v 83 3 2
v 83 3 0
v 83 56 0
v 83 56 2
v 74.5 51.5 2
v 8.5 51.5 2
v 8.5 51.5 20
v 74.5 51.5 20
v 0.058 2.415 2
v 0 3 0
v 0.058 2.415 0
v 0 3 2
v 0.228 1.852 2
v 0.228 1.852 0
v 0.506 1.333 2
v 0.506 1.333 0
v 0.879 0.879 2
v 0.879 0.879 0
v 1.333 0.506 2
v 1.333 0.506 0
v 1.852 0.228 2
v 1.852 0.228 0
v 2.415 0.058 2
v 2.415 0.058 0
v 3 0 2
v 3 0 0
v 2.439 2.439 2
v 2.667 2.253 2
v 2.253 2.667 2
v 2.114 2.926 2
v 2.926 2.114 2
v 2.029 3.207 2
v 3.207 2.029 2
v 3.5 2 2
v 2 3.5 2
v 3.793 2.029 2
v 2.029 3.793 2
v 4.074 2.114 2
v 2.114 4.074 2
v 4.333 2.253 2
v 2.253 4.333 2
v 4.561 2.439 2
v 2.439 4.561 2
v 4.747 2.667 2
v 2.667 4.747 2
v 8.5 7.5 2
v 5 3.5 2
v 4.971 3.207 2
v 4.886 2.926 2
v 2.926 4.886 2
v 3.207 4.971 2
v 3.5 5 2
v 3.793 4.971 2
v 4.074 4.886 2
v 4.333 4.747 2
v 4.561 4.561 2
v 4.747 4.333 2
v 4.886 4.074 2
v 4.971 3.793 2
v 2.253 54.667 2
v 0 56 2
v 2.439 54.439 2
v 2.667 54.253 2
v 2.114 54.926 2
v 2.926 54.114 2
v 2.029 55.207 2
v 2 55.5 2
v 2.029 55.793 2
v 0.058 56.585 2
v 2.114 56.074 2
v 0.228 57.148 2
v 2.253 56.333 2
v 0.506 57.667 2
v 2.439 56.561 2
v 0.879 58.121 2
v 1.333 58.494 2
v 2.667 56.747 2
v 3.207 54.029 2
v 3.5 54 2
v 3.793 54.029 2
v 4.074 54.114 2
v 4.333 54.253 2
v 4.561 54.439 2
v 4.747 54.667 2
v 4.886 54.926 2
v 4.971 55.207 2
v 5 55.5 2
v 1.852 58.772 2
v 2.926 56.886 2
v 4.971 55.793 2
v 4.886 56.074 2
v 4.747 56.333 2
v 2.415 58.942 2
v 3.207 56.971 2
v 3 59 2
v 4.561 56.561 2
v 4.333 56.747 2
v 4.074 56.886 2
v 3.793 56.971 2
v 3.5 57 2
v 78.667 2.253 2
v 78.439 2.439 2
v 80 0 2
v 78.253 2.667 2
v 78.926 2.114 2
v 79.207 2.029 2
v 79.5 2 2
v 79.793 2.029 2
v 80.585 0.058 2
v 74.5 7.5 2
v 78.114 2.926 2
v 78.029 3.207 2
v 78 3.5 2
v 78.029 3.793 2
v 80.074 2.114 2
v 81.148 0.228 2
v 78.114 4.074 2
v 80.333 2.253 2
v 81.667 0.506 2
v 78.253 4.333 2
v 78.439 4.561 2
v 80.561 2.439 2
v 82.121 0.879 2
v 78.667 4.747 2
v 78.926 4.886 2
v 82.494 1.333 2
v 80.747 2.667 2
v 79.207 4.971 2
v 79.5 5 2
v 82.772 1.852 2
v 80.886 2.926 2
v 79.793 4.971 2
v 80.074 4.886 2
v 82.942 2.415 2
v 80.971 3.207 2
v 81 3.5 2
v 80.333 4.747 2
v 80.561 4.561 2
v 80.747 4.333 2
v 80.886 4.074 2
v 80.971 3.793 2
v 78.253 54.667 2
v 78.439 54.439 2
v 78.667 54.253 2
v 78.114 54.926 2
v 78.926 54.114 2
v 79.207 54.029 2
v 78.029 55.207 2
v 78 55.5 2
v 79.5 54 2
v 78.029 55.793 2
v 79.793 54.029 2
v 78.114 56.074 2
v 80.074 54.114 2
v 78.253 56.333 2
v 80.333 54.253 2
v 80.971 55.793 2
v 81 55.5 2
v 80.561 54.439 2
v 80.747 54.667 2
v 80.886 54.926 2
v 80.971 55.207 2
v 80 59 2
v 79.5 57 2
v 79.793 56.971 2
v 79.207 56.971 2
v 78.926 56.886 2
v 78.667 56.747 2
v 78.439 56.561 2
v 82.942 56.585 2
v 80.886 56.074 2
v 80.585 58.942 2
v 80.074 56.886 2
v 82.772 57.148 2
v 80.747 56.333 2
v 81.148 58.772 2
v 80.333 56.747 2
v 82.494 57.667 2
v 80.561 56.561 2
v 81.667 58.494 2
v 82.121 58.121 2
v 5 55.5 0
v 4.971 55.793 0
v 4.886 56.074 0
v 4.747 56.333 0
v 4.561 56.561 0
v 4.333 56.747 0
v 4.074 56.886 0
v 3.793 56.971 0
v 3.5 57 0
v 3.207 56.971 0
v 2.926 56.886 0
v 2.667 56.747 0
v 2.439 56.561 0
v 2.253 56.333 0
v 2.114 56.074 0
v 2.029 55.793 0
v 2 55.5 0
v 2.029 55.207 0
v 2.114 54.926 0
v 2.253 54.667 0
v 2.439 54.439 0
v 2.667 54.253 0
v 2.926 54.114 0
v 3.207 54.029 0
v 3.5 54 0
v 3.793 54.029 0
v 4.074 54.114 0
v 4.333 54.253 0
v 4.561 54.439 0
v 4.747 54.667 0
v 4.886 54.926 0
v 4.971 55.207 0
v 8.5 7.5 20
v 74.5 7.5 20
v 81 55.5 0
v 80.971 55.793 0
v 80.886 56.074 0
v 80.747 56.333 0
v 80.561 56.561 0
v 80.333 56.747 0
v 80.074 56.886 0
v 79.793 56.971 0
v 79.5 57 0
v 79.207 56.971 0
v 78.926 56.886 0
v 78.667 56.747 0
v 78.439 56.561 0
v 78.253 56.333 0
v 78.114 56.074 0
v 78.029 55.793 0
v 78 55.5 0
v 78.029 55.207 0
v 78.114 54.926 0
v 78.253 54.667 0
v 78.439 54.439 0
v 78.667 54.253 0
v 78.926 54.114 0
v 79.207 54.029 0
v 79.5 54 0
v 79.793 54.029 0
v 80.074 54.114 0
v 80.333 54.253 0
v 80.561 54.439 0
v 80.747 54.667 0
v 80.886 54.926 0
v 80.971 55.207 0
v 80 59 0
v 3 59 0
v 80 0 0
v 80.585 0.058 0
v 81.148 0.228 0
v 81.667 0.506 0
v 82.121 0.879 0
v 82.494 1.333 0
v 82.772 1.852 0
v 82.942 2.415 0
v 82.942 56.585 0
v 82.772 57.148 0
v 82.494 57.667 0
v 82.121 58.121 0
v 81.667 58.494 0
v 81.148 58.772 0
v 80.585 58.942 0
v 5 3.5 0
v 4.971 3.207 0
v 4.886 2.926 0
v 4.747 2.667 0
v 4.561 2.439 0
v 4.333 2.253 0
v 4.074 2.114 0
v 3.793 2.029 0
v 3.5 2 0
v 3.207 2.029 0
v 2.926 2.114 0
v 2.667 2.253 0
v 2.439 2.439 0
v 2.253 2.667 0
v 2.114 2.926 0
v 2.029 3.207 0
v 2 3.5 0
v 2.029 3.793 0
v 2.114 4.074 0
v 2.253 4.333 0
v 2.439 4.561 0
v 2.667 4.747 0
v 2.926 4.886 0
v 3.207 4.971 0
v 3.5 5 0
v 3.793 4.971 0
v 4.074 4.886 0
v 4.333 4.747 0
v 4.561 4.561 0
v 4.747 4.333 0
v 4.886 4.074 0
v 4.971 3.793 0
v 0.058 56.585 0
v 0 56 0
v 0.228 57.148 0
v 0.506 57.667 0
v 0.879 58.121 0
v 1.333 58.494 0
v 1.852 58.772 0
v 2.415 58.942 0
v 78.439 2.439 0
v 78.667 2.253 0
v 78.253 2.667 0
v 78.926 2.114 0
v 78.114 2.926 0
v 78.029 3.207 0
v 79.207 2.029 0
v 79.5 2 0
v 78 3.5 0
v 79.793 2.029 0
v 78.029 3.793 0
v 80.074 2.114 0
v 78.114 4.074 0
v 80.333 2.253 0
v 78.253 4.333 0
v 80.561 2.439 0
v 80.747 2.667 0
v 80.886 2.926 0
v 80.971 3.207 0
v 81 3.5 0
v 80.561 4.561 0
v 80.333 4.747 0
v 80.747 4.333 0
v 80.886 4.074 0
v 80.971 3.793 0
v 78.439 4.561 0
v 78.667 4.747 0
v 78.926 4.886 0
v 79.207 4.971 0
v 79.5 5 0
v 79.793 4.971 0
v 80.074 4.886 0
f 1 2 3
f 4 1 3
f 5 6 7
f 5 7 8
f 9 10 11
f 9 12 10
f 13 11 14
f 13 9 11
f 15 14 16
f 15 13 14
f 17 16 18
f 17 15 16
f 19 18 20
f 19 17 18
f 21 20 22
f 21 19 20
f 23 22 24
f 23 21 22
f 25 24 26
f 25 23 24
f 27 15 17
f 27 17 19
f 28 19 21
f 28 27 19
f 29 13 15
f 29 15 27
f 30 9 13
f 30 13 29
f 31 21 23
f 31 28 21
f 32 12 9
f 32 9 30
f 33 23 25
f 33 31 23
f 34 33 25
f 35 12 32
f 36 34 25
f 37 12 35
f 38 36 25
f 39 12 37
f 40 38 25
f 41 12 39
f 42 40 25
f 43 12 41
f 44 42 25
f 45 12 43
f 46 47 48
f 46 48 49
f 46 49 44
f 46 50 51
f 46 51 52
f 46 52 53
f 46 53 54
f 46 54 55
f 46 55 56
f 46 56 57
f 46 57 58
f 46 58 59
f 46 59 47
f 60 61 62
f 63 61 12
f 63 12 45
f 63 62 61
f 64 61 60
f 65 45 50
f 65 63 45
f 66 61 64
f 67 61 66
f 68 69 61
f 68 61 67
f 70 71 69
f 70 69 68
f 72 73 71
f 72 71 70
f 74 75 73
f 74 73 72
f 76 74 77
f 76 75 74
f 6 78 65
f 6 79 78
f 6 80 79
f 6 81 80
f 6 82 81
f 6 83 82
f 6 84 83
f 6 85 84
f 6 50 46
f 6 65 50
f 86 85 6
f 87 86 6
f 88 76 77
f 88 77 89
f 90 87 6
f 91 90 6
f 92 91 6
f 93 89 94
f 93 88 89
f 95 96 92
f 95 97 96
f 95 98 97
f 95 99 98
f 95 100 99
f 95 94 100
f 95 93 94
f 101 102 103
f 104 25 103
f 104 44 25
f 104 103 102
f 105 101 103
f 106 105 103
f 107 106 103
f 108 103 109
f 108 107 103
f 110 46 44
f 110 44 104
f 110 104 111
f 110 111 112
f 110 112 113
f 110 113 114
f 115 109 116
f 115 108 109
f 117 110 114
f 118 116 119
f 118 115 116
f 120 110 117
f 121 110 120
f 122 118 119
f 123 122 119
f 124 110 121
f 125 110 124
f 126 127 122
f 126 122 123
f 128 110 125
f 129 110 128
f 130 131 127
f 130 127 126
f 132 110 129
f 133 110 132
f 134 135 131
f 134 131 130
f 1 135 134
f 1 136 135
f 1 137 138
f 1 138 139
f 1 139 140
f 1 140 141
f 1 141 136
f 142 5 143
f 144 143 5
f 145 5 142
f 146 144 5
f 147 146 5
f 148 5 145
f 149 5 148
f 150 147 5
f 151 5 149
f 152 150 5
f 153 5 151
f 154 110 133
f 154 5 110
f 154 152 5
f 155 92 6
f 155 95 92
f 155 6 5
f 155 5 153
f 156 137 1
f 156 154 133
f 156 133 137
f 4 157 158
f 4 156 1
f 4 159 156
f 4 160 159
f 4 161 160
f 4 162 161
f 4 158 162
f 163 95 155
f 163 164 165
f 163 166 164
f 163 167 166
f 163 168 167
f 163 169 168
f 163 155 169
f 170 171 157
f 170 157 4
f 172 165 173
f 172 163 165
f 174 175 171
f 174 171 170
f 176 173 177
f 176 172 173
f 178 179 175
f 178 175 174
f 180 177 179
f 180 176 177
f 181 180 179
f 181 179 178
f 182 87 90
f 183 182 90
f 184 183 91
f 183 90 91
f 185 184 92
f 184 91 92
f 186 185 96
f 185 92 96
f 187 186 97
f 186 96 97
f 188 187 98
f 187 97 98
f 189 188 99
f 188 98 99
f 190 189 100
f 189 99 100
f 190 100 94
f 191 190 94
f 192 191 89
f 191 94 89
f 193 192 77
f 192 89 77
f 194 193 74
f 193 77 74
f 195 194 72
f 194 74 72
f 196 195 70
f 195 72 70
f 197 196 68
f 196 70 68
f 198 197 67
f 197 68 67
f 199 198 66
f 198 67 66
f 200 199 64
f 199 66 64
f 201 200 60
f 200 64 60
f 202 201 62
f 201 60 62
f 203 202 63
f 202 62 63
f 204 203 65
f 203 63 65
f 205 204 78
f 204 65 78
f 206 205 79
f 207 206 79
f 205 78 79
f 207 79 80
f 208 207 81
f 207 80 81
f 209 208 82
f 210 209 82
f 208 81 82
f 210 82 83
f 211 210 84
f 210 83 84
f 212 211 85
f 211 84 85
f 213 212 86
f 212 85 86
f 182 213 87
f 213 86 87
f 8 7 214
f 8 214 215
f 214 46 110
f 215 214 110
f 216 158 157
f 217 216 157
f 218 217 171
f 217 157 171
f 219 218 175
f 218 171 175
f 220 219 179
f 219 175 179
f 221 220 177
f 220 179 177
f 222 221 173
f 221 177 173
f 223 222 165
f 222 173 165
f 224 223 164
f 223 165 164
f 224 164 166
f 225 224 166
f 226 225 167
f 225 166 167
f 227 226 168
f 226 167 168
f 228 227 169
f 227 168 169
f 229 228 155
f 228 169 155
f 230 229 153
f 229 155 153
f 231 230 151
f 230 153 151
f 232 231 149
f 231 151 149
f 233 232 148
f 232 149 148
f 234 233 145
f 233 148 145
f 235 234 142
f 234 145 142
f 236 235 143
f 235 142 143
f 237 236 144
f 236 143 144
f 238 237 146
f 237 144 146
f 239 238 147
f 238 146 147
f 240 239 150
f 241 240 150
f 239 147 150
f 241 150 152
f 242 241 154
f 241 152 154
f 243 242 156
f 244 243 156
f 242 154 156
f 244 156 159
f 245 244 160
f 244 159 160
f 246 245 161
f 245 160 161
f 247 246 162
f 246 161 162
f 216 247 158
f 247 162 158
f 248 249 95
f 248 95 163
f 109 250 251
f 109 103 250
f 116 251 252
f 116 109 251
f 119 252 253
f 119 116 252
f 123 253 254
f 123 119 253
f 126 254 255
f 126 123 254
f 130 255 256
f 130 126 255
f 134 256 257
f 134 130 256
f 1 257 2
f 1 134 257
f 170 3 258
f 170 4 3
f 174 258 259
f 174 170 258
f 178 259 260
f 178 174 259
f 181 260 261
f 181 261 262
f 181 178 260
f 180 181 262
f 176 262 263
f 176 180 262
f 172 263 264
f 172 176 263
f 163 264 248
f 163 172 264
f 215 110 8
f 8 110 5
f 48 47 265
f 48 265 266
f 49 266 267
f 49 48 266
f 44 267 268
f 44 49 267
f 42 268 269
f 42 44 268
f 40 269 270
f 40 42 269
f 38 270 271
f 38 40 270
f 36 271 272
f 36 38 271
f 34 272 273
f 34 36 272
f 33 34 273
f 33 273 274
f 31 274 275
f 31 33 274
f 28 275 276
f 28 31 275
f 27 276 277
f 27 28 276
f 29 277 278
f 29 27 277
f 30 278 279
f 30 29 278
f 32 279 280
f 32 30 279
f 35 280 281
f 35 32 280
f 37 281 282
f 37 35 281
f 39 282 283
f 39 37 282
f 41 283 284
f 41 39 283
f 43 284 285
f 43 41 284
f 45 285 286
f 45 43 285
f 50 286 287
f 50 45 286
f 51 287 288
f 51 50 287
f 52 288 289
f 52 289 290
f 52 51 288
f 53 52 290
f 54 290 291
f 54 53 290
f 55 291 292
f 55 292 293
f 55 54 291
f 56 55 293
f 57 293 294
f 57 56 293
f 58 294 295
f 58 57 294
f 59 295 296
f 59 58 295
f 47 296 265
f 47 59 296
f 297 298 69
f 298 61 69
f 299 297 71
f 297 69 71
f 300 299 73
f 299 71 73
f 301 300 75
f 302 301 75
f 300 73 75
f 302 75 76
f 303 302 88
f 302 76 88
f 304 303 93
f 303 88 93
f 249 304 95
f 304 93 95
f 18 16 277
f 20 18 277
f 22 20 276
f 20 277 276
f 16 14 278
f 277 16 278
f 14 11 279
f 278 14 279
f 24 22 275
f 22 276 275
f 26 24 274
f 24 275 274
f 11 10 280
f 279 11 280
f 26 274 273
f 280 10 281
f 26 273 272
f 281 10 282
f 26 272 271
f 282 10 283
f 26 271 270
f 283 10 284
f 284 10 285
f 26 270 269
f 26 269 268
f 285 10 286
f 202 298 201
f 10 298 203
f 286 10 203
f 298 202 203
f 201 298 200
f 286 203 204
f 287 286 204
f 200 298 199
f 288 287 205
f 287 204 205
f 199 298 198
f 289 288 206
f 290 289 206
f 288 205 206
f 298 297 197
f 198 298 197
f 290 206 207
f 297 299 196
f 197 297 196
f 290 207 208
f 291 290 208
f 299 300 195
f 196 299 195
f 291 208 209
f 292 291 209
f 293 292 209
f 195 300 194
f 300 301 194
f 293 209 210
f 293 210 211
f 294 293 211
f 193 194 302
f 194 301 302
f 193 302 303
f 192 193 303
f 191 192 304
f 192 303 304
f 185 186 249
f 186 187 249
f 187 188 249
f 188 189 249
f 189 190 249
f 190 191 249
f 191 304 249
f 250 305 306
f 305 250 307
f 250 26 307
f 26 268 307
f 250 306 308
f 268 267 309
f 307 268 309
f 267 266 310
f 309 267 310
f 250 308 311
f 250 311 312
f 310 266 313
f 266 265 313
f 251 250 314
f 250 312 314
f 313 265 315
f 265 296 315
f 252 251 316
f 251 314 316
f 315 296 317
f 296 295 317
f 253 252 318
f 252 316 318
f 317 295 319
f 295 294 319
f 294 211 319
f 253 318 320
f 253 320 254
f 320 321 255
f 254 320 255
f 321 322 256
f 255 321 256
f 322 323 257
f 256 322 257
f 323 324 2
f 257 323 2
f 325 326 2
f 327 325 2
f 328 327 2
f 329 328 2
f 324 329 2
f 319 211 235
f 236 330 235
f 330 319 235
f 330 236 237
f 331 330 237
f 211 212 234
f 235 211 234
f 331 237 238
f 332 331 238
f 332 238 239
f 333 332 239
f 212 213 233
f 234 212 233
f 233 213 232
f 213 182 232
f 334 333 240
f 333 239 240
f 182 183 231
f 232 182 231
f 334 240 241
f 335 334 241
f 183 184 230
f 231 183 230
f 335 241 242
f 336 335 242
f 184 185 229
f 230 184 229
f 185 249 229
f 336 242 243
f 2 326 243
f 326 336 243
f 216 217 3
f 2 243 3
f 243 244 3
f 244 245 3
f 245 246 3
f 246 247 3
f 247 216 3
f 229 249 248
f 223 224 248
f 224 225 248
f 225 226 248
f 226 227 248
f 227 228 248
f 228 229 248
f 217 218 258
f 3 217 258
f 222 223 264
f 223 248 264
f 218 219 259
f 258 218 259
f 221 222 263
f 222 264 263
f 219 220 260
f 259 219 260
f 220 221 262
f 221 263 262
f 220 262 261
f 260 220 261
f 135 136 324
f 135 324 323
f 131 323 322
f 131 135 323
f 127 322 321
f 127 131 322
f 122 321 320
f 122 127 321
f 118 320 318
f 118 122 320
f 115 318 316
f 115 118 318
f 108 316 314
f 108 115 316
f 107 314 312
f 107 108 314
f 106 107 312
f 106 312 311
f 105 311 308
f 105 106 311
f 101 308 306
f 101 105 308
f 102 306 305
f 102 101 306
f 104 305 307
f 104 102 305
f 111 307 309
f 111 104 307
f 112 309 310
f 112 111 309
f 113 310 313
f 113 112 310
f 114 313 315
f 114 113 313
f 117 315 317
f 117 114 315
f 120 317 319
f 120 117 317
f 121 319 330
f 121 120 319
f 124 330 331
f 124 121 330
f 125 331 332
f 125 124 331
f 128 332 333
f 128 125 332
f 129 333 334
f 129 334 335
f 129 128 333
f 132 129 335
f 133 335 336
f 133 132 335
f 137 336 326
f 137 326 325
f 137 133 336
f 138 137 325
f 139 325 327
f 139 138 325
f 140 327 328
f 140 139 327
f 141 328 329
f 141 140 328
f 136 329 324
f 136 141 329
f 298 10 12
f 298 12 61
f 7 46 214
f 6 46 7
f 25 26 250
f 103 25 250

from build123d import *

# Parameters (mm, degrees)
SKETCH1_W           = 83
SKETCH1_H           = 59
BOSS_EXTRUDE1_DEPTH = 2
FILLET1_R           = 3
SKETCH2_R           = 1.5
CUT_EXTRUDE1_DEPTH  = 2
SKETCH4_W           = 66
SKETCH4_H           = 44
BOSS_EXTRUDE2_DEPTH = 18


with BuildPart() as part:
    # Sketch1 → Boss-Extrude1 (new body)
    with BuildSketch(Plane.XY):
        with Locations((41.5, 29.5)):
            Rectangle(SKETCH1_W, SKETCH1_H)
    extrude(amount=BOSS_EXTRUDE1_DEPTH)

    # Fillet1
    fillet1_edges = [part.edges().sort_by_distance(p)[0] for p in [
        (0, 59, 1),
        (83, 59, 1),
        (83, 0, 1),
        (0, 0, 1),
    ]]
    fillet(fillet1_edges, radius=FILLET1_R)

    # Sketch2 → Cut-Extrude1 (cut)
    with BuildSketch(Plane.XY.offset(2)):
        with Locations((3.5, 55.5)):
            Circle(SKETCH2_R)
        with Locations((79.5, 55.5)):
            Circle(SKETCH2_R)
    cut_extrude1 = extrude(amount=-CUT_EXTRUDE1_DEPTH, mode=Mode.SUBTRACT)

    # Mirror1: Cut-Extrude1 across plane
    add(cut_extrude1.mirror(Plane(origin=(0, 29.5, 0), x_dir=(0, 0, 1), z_dir=(0, -1, 0))), mode=Mode.SUBTRACT)

    # Sketch4 → Boss-Extrude2 (add)
    with BuildSketch(Plane.XY.offset(2)):
        with Locations((41.5, 29.5)):
            Rectangle(SKETCH4_W, SKETCH4_H)
    extrude(amount=BOSS_EXTRUDE2_DEPTH)


solid = part.part
